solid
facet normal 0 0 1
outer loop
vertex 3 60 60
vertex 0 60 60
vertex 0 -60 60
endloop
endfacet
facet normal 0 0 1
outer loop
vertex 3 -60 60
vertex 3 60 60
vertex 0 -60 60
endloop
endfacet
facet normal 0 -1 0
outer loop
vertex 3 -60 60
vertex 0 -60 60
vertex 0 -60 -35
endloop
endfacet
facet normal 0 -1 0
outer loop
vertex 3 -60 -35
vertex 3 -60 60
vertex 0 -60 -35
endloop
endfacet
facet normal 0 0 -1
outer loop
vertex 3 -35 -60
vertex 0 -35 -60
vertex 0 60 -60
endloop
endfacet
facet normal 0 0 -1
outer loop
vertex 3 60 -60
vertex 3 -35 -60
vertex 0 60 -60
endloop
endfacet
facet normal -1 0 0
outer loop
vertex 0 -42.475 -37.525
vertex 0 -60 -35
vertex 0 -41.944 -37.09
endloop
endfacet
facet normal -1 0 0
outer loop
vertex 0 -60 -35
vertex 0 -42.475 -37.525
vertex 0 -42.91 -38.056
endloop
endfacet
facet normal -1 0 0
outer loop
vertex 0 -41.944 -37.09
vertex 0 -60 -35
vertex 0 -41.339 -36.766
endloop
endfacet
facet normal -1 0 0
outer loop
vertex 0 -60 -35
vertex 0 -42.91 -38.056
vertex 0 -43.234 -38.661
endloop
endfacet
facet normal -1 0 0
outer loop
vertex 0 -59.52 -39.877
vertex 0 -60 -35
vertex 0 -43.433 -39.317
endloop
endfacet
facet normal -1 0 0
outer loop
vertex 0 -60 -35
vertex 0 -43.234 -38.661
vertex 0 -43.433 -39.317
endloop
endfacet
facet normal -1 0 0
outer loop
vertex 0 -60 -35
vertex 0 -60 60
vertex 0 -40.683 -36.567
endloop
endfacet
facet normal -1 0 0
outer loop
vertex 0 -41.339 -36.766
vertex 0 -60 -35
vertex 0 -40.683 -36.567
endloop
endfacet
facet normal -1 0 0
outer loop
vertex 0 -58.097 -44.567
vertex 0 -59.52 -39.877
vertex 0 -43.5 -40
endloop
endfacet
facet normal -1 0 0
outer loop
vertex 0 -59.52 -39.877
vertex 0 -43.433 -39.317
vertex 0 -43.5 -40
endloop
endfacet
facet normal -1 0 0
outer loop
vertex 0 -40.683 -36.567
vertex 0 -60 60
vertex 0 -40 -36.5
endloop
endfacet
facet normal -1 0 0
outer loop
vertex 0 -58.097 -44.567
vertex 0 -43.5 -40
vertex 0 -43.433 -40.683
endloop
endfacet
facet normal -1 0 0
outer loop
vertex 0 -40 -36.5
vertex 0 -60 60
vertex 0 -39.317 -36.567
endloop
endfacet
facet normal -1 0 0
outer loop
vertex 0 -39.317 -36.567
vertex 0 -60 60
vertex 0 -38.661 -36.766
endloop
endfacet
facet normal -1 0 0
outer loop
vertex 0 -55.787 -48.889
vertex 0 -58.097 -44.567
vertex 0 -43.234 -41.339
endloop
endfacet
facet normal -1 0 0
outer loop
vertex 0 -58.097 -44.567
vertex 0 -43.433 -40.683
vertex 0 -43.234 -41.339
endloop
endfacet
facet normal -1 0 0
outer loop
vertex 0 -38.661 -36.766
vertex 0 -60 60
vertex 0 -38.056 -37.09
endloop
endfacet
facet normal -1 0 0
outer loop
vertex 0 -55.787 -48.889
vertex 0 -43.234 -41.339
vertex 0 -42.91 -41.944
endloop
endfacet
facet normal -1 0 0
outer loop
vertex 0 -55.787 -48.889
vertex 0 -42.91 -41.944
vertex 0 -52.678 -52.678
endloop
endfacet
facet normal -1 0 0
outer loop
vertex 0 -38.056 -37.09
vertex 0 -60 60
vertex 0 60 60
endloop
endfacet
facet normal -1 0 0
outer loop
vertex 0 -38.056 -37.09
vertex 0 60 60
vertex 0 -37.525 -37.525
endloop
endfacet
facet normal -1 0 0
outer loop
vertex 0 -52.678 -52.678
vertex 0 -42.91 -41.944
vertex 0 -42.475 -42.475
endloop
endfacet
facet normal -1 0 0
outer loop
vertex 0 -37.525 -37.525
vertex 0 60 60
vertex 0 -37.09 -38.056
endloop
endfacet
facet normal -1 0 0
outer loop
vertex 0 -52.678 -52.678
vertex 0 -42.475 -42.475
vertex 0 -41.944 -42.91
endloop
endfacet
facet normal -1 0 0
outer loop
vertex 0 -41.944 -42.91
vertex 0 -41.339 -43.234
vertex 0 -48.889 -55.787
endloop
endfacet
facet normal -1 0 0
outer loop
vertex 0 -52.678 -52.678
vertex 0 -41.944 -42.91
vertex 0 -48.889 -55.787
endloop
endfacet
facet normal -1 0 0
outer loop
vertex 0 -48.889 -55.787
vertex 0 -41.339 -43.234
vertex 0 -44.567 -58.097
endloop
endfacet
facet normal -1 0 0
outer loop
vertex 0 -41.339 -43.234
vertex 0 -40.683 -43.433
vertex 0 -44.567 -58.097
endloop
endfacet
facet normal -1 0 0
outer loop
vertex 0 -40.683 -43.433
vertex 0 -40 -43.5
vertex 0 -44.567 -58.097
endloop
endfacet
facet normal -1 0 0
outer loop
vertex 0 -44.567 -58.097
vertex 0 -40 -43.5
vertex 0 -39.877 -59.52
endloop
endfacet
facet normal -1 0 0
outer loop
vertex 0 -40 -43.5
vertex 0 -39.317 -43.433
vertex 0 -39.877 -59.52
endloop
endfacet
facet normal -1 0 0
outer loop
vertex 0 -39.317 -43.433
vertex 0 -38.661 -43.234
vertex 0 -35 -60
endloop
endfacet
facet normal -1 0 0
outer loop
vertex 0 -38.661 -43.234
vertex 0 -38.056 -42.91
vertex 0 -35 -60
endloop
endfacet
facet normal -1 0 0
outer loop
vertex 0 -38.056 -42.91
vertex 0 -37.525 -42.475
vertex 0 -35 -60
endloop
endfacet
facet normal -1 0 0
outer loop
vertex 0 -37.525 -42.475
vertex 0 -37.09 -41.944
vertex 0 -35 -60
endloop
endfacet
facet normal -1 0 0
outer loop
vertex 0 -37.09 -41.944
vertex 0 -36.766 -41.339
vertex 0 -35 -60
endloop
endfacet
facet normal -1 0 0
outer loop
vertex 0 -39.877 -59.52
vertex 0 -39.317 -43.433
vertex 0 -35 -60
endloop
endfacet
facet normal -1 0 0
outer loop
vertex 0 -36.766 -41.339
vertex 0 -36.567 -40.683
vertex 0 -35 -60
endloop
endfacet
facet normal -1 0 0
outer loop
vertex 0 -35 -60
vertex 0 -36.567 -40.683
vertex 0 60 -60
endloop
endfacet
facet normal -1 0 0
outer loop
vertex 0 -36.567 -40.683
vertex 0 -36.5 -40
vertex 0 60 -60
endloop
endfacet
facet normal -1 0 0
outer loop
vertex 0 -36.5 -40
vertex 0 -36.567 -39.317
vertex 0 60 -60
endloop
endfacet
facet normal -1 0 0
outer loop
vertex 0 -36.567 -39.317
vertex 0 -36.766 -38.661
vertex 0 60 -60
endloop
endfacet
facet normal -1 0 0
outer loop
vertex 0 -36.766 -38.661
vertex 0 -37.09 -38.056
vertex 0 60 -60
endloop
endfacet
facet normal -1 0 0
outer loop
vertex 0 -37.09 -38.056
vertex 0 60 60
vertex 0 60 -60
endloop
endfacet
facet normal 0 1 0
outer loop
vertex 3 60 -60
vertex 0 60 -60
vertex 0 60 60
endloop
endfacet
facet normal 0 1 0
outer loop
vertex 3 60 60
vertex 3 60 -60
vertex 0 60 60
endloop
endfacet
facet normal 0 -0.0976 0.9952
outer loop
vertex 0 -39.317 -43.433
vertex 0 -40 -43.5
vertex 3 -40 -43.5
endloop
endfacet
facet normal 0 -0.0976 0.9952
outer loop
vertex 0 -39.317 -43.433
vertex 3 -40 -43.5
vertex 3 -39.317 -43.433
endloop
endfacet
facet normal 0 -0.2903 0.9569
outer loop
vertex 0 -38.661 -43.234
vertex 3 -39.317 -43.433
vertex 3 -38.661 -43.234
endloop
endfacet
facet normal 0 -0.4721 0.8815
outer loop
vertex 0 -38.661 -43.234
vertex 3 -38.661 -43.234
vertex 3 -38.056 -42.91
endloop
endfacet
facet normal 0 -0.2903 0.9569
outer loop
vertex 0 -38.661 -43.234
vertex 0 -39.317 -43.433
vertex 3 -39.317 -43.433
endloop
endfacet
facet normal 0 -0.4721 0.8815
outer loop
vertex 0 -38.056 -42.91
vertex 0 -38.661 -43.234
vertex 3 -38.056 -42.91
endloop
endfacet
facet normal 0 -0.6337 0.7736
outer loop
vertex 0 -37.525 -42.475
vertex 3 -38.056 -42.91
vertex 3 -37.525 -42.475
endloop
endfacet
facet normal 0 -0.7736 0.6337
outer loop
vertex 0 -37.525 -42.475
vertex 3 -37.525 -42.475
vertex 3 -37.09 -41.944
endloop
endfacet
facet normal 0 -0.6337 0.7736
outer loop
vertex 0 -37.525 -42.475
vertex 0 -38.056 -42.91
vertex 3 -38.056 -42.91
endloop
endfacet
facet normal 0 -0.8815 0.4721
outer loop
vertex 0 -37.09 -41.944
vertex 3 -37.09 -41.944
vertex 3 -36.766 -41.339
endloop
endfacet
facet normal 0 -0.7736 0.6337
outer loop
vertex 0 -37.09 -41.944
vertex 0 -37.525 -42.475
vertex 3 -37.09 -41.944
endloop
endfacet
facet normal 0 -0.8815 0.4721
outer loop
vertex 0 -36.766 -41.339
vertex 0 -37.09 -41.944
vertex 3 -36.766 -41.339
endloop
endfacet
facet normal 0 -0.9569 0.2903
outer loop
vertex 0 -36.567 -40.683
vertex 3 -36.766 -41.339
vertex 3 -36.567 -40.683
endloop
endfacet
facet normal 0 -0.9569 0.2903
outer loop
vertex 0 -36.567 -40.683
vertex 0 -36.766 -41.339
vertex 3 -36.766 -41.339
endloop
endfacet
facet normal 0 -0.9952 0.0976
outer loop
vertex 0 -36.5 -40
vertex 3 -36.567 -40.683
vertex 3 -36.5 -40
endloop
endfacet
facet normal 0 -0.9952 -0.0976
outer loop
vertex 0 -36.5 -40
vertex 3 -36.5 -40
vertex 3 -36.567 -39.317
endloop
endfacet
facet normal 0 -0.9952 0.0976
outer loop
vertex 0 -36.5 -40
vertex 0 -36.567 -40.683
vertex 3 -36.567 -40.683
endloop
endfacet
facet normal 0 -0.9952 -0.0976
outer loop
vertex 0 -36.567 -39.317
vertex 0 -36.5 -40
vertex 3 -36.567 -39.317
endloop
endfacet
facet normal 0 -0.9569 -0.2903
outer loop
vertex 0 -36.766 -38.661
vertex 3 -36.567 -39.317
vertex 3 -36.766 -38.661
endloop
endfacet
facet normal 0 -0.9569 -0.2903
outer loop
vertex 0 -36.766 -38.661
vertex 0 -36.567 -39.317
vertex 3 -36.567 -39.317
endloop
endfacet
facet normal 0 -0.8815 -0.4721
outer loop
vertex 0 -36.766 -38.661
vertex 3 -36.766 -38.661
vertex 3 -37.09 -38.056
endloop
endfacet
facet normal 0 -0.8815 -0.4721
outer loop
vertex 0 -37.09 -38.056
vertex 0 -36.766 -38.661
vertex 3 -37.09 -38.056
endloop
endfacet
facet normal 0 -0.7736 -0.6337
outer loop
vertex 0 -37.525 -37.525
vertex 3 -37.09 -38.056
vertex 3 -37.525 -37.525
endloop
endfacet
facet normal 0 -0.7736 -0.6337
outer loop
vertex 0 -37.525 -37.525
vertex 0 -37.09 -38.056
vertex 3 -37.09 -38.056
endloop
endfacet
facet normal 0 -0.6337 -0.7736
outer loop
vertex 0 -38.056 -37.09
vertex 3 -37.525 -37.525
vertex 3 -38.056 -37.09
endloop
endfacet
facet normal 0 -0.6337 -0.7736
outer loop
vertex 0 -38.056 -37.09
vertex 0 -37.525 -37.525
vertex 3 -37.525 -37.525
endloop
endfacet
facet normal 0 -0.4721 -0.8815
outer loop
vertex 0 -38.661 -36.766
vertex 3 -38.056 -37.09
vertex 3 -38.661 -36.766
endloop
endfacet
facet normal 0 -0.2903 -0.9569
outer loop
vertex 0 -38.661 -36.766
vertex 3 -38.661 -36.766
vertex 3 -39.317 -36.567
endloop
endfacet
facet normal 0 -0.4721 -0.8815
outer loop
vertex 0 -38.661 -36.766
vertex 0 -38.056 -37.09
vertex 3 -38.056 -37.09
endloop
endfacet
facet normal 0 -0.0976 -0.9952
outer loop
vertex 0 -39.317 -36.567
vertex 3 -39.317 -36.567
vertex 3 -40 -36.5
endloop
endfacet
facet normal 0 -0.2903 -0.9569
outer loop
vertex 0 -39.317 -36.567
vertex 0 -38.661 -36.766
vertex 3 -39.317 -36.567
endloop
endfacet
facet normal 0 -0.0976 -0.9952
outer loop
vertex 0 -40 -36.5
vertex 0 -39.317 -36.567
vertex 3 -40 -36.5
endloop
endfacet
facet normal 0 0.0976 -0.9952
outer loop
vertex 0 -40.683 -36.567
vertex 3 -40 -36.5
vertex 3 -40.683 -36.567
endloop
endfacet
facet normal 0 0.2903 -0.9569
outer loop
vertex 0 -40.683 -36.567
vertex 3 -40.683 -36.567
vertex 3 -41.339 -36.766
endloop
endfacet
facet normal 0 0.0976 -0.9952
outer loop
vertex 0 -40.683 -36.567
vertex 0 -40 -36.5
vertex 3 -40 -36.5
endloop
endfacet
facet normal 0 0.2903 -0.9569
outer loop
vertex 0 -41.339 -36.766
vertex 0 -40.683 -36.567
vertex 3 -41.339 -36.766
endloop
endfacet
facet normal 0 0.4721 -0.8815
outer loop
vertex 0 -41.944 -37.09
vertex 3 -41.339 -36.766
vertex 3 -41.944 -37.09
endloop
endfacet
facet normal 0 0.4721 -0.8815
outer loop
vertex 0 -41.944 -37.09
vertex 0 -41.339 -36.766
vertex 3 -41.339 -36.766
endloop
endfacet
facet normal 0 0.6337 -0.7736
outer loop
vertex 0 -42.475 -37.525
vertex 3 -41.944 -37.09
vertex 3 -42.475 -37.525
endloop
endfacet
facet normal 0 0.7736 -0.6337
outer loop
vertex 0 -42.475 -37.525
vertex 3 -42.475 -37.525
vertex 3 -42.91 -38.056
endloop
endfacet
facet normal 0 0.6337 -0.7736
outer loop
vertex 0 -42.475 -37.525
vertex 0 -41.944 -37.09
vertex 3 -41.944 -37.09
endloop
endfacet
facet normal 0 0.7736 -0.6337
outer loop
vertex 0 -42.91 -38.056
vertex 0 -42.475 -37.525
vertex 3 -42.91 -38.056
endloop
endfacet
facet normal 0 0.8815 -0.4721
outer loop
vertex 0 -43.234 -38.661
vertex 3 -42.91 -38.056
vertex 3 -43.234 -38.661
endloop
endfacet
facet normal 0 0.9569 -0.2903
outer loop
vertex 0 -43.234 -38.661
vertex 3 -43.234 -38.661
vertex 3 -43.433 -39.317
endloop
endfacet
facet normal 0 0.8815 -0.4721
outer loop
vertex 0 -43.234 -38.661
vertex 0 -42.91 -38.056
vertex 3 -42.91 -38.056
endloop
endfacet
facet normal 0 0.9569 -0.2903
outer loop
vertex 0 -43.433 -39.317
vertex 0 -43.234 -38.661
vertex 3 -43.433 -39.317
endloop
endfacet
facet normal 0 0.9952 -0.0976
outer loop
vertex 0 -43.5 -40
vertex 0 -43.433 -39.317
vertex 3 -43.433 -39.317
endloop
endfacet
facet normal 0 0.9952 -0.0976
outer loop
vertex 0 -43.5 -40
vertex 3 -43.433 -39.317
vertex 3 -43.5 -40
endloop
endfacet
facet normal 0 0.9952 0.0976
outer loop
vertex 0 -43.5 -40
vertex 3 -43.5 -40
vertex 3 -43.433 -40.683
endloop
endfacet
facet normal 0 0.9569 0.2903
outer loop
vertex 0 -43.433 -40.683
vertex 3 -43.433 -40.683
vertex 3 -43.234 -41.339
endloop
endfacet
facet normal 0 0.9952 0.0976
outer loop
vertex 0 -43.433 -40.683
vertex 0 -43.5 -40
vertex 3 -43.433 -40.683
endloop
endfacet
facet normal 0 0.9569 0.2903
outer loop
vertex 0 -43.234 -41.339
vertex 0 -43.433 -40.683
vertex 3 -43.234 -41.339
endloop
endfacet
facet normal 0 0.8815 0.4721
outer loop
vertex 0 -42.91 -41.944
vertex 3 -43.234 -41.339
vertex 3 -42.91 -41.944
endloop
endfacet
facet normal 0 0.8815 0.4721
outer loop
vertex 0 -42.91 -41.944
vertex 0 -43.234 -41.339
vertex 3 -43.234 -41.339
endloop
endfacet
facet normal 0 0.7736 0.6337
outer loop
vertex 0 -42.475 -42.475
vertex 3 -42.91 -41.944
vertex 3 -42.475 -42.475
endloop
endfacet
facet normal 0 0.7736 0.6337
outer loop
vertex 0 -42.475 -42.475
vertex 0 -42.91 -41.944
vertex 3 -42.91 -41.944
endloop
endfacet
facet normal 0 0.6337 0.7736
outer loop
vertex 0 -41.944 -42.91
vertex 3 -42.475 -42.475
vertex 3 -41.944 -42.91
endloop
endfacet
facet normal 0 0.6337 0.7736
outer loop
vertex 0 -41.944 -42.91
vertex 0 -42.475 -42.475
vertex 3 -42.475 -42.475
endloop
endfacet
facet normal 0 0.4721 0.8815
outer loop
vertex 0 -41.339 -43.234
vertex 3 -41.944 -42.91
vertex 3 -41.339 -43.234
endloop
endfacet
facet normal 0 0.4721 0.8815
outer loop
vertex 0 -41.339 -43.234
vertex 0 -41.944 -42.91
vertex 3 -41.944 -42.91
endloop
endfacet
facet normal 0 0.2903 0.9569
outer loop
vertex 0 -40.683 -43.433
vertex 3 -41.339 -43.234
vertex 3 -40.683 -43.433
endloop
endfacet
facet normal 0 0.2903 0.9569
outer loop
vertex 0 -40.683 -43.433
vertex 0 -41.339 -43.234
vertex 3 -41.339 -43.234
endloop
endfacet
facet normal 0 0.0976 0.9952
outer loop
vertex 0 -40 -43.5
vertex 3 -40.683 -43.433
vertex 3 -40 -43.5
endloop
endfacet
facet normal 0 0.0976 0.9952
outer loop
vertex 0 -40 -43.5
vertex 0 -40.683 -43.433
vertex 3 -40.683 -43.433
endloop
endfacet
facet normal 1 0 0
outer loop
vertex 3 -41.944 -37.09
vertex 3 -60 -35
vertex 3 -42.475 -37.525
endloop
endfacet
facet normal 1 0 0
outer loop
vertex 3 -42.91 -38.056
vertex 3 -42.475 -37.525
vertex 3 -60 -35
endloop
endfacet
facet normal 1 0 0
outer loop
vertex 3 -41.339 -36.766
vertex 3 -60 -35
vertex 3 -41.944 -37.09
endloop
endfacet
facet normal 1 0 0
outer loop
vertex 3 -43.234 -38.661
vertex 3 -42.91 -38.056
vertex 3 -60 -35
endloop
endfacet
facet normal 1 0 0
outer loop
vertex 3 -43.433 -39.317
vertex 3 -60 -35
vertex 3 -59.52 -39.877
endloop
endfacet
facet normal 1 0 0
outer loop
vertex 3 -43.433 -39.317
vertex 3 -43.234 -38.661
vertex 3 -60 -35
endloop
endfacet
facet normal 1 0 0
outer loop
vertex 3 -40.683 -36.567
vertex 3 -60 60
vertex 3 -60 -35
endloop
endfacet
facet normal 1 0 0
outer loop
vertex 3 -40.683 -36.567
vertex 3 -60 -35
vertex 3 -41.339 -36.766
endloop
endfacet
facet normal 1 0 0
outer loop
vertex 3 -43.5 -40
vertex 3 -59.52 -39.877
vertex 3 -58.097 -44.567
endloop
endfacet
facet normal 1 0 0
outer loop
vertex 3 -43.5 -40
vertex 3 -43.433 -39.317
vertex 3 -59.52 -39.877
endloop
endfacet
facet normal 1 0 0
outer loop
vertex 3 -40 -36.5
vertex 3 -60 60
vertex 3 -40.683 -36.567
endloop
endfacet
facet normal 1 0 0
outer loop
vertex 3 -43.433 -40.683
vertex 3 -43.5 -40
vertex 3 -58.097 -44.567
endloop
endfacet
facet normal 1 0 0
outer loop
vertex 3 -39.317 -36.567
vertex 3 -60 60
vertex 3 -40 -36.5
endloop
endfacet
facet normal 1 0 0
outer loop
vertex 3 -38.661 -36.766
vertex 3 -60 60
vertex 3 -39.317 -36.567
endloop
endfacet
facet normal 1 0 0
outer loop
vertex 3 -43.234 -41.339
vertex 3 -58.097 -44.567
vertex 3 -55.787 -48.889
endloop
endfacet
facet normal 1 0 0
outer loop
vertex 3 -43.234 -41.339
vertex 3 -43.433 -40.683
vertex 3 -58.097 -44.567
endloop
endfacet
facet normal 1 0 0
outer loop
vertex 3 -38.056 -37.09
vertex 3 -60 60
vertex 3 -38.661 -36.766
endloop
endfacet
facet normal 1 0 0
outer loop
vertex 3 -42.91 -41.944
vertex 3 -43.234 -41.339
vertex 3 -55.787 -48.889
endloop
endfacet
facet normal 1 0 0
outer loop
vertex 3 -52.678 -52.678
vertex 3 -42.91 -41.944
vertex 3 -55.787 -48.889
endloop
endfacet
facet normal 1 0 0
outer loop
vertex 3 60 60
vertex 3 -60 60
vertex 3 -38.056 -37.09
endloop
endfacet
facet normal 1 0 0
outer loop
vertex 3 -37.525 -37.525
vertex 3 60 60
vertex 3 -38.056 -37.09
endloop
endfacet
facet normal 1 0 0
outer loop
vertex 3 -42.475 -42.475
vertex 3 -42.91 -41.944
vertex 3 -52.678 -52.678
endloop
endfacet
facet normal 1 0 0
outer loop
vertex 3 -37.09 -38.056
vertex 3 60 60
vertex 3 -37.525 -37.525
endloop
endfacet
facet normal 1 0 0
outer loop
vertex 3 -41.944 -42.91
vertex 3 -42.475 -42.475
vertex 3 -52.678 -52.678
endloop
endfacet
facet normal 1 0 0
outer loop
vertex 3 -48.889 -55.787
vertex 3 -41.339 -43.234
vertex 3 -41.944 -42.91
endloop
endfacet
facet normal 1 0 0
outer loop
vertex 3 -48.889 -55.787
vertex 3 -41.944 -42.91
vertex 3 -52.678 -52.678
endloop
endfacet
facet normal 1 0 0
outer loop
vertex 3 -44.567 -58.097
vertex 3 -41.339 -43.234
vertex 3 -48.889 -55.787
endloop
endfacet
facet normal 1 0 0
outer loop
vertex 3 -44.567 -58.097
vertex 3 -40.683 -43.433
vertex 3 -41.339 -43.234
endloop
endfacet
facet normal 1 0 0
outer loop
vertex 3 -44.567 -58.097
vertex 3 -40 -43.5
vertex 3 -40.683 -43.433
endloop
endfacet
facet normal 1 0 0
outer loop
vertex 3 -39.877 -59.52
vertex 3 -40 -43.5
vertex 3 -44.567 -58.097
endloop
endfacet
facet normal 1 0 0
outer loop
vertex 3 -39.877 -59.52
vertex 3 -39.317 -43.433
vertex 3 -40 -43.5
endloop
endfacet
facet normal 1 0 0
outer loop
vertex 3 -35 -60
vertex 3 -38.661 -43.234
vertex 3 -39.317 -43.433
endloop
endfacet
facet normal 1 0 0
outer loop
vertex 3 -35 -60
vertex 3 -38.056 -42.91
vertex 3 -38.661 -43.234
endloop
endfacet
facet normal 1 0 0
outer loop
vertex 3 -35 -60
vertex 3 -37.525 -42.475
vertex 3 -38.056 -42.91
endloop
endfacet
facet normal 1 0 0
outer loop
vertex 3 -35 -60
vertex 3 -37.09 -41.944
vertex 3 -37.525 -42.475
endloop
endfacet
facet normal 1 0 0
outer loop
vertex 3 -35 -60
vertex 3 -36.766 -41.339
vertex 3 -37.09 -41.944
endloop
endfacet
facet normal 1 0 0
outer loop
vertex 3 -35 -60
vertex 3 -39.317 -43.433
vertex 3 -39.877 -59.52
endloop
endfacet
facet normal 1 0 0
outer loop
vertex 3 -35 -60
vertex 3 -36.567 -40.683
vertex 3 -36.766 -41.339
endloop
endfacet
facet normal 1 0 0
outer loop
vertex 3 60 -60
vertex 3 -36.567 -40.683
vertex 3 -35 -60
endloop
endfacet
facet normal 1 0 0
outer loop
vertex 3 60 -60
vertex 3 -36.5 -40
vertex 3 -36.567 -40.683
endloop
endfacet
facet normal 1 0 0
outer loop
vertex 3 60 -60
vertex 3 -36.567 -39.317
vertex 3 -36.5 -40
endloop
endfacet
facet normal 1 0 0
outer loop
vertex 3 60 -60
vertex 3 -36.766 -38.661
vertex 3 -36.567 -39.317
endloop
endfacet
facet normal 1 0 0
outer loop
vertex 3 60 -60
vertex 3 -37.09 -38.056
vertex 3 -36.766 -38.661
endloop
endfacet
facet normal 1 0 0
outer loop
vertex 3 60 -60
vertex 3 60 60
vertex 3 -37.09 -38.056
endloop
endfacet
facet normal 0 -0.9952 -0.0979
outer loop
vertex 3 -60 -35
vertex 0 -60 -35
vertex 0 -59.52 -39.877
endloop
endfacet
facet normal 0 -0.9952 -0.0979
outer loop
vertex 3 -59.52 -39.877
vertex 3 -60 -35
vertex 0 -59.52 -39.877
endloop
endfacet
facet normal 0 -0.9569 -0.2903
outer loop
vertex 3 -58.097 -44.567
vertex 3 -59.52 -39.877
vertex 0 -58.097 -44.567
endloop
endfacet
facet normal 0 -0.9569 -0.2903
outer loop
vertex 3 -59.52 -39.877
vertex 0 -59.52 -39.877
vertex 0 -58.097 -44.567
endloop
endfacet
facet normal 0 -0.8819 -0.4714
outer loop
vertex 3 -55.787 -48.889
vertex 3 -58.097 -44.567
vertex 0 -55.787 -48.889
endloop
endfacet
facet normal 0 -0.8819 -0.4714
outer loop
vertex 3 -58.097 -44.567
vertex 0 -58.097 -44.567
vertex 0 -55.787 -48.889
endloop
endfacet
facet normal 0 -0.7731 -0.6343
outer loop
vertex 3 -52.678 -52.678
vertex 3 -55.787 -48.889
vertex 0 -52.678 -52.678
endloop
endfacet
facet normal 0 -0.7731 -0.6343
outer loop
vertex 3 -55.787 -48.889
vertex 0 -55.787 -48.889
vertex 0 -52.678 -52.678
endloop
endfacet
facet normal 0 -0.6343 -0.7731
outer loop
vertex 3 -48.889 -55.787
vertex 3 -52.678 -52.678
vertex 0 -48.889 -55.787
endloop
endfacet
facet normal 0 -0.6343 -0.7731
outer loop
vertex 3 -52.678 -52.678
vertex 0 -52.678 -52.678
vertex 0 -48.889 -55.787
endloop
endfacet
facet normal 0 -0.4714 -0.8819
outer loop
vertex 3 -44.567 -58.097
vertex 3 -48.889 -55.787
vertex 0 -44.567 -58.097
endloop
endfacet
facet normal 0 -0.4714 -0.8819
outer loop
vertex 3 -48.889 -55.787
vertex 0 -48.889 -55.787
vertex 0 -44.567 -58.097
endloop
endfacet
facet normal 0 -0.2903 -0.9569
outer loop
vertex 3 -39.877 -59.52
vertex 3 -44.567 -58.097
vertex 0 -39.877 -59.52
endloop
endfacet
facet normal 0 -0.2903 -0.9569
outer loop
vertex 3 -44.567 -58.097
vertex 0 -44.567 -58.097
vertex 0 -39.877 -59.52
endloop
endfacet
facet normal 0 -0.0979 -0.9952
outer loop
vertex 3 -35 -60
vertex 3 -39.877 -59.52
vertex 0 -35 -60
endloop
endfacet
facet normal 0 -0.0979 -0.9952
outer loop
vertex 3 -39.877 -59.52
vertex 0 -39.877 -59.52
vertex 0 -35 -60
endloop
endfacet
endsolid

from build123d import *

# Parameters (mm, degrees)
SKETCH1_R           = 3.5
BOSS_EXTRUDE1_DEPTH = 3


with BuildPart() as part:
    # Sketch1 → Boss-Extrude1 (new body)
    with BuildSketch(Plane(origin=(0, 0, 0), x_dir=(0, 0, -1), z_dir=(1, 0, 0))):
        with BuildLine():
            Line((60, 60), (-60, 60))
            Line((-60, 60), (-60, -60))
            Line((-60, -60), (35, -60))
            ThreePointArc((35, -60), (52.67766953, -52.67766953), (60, -35))
            Line((60, -35), (60, 60))
        make_face()
        with Locations((40, -40)):
            Circle(SKETCH1_R, mode=Mode.SUBTRACT)
    extrude(amount=BOSS_EXTRUDE1_DEPTH)


solid = part.part
